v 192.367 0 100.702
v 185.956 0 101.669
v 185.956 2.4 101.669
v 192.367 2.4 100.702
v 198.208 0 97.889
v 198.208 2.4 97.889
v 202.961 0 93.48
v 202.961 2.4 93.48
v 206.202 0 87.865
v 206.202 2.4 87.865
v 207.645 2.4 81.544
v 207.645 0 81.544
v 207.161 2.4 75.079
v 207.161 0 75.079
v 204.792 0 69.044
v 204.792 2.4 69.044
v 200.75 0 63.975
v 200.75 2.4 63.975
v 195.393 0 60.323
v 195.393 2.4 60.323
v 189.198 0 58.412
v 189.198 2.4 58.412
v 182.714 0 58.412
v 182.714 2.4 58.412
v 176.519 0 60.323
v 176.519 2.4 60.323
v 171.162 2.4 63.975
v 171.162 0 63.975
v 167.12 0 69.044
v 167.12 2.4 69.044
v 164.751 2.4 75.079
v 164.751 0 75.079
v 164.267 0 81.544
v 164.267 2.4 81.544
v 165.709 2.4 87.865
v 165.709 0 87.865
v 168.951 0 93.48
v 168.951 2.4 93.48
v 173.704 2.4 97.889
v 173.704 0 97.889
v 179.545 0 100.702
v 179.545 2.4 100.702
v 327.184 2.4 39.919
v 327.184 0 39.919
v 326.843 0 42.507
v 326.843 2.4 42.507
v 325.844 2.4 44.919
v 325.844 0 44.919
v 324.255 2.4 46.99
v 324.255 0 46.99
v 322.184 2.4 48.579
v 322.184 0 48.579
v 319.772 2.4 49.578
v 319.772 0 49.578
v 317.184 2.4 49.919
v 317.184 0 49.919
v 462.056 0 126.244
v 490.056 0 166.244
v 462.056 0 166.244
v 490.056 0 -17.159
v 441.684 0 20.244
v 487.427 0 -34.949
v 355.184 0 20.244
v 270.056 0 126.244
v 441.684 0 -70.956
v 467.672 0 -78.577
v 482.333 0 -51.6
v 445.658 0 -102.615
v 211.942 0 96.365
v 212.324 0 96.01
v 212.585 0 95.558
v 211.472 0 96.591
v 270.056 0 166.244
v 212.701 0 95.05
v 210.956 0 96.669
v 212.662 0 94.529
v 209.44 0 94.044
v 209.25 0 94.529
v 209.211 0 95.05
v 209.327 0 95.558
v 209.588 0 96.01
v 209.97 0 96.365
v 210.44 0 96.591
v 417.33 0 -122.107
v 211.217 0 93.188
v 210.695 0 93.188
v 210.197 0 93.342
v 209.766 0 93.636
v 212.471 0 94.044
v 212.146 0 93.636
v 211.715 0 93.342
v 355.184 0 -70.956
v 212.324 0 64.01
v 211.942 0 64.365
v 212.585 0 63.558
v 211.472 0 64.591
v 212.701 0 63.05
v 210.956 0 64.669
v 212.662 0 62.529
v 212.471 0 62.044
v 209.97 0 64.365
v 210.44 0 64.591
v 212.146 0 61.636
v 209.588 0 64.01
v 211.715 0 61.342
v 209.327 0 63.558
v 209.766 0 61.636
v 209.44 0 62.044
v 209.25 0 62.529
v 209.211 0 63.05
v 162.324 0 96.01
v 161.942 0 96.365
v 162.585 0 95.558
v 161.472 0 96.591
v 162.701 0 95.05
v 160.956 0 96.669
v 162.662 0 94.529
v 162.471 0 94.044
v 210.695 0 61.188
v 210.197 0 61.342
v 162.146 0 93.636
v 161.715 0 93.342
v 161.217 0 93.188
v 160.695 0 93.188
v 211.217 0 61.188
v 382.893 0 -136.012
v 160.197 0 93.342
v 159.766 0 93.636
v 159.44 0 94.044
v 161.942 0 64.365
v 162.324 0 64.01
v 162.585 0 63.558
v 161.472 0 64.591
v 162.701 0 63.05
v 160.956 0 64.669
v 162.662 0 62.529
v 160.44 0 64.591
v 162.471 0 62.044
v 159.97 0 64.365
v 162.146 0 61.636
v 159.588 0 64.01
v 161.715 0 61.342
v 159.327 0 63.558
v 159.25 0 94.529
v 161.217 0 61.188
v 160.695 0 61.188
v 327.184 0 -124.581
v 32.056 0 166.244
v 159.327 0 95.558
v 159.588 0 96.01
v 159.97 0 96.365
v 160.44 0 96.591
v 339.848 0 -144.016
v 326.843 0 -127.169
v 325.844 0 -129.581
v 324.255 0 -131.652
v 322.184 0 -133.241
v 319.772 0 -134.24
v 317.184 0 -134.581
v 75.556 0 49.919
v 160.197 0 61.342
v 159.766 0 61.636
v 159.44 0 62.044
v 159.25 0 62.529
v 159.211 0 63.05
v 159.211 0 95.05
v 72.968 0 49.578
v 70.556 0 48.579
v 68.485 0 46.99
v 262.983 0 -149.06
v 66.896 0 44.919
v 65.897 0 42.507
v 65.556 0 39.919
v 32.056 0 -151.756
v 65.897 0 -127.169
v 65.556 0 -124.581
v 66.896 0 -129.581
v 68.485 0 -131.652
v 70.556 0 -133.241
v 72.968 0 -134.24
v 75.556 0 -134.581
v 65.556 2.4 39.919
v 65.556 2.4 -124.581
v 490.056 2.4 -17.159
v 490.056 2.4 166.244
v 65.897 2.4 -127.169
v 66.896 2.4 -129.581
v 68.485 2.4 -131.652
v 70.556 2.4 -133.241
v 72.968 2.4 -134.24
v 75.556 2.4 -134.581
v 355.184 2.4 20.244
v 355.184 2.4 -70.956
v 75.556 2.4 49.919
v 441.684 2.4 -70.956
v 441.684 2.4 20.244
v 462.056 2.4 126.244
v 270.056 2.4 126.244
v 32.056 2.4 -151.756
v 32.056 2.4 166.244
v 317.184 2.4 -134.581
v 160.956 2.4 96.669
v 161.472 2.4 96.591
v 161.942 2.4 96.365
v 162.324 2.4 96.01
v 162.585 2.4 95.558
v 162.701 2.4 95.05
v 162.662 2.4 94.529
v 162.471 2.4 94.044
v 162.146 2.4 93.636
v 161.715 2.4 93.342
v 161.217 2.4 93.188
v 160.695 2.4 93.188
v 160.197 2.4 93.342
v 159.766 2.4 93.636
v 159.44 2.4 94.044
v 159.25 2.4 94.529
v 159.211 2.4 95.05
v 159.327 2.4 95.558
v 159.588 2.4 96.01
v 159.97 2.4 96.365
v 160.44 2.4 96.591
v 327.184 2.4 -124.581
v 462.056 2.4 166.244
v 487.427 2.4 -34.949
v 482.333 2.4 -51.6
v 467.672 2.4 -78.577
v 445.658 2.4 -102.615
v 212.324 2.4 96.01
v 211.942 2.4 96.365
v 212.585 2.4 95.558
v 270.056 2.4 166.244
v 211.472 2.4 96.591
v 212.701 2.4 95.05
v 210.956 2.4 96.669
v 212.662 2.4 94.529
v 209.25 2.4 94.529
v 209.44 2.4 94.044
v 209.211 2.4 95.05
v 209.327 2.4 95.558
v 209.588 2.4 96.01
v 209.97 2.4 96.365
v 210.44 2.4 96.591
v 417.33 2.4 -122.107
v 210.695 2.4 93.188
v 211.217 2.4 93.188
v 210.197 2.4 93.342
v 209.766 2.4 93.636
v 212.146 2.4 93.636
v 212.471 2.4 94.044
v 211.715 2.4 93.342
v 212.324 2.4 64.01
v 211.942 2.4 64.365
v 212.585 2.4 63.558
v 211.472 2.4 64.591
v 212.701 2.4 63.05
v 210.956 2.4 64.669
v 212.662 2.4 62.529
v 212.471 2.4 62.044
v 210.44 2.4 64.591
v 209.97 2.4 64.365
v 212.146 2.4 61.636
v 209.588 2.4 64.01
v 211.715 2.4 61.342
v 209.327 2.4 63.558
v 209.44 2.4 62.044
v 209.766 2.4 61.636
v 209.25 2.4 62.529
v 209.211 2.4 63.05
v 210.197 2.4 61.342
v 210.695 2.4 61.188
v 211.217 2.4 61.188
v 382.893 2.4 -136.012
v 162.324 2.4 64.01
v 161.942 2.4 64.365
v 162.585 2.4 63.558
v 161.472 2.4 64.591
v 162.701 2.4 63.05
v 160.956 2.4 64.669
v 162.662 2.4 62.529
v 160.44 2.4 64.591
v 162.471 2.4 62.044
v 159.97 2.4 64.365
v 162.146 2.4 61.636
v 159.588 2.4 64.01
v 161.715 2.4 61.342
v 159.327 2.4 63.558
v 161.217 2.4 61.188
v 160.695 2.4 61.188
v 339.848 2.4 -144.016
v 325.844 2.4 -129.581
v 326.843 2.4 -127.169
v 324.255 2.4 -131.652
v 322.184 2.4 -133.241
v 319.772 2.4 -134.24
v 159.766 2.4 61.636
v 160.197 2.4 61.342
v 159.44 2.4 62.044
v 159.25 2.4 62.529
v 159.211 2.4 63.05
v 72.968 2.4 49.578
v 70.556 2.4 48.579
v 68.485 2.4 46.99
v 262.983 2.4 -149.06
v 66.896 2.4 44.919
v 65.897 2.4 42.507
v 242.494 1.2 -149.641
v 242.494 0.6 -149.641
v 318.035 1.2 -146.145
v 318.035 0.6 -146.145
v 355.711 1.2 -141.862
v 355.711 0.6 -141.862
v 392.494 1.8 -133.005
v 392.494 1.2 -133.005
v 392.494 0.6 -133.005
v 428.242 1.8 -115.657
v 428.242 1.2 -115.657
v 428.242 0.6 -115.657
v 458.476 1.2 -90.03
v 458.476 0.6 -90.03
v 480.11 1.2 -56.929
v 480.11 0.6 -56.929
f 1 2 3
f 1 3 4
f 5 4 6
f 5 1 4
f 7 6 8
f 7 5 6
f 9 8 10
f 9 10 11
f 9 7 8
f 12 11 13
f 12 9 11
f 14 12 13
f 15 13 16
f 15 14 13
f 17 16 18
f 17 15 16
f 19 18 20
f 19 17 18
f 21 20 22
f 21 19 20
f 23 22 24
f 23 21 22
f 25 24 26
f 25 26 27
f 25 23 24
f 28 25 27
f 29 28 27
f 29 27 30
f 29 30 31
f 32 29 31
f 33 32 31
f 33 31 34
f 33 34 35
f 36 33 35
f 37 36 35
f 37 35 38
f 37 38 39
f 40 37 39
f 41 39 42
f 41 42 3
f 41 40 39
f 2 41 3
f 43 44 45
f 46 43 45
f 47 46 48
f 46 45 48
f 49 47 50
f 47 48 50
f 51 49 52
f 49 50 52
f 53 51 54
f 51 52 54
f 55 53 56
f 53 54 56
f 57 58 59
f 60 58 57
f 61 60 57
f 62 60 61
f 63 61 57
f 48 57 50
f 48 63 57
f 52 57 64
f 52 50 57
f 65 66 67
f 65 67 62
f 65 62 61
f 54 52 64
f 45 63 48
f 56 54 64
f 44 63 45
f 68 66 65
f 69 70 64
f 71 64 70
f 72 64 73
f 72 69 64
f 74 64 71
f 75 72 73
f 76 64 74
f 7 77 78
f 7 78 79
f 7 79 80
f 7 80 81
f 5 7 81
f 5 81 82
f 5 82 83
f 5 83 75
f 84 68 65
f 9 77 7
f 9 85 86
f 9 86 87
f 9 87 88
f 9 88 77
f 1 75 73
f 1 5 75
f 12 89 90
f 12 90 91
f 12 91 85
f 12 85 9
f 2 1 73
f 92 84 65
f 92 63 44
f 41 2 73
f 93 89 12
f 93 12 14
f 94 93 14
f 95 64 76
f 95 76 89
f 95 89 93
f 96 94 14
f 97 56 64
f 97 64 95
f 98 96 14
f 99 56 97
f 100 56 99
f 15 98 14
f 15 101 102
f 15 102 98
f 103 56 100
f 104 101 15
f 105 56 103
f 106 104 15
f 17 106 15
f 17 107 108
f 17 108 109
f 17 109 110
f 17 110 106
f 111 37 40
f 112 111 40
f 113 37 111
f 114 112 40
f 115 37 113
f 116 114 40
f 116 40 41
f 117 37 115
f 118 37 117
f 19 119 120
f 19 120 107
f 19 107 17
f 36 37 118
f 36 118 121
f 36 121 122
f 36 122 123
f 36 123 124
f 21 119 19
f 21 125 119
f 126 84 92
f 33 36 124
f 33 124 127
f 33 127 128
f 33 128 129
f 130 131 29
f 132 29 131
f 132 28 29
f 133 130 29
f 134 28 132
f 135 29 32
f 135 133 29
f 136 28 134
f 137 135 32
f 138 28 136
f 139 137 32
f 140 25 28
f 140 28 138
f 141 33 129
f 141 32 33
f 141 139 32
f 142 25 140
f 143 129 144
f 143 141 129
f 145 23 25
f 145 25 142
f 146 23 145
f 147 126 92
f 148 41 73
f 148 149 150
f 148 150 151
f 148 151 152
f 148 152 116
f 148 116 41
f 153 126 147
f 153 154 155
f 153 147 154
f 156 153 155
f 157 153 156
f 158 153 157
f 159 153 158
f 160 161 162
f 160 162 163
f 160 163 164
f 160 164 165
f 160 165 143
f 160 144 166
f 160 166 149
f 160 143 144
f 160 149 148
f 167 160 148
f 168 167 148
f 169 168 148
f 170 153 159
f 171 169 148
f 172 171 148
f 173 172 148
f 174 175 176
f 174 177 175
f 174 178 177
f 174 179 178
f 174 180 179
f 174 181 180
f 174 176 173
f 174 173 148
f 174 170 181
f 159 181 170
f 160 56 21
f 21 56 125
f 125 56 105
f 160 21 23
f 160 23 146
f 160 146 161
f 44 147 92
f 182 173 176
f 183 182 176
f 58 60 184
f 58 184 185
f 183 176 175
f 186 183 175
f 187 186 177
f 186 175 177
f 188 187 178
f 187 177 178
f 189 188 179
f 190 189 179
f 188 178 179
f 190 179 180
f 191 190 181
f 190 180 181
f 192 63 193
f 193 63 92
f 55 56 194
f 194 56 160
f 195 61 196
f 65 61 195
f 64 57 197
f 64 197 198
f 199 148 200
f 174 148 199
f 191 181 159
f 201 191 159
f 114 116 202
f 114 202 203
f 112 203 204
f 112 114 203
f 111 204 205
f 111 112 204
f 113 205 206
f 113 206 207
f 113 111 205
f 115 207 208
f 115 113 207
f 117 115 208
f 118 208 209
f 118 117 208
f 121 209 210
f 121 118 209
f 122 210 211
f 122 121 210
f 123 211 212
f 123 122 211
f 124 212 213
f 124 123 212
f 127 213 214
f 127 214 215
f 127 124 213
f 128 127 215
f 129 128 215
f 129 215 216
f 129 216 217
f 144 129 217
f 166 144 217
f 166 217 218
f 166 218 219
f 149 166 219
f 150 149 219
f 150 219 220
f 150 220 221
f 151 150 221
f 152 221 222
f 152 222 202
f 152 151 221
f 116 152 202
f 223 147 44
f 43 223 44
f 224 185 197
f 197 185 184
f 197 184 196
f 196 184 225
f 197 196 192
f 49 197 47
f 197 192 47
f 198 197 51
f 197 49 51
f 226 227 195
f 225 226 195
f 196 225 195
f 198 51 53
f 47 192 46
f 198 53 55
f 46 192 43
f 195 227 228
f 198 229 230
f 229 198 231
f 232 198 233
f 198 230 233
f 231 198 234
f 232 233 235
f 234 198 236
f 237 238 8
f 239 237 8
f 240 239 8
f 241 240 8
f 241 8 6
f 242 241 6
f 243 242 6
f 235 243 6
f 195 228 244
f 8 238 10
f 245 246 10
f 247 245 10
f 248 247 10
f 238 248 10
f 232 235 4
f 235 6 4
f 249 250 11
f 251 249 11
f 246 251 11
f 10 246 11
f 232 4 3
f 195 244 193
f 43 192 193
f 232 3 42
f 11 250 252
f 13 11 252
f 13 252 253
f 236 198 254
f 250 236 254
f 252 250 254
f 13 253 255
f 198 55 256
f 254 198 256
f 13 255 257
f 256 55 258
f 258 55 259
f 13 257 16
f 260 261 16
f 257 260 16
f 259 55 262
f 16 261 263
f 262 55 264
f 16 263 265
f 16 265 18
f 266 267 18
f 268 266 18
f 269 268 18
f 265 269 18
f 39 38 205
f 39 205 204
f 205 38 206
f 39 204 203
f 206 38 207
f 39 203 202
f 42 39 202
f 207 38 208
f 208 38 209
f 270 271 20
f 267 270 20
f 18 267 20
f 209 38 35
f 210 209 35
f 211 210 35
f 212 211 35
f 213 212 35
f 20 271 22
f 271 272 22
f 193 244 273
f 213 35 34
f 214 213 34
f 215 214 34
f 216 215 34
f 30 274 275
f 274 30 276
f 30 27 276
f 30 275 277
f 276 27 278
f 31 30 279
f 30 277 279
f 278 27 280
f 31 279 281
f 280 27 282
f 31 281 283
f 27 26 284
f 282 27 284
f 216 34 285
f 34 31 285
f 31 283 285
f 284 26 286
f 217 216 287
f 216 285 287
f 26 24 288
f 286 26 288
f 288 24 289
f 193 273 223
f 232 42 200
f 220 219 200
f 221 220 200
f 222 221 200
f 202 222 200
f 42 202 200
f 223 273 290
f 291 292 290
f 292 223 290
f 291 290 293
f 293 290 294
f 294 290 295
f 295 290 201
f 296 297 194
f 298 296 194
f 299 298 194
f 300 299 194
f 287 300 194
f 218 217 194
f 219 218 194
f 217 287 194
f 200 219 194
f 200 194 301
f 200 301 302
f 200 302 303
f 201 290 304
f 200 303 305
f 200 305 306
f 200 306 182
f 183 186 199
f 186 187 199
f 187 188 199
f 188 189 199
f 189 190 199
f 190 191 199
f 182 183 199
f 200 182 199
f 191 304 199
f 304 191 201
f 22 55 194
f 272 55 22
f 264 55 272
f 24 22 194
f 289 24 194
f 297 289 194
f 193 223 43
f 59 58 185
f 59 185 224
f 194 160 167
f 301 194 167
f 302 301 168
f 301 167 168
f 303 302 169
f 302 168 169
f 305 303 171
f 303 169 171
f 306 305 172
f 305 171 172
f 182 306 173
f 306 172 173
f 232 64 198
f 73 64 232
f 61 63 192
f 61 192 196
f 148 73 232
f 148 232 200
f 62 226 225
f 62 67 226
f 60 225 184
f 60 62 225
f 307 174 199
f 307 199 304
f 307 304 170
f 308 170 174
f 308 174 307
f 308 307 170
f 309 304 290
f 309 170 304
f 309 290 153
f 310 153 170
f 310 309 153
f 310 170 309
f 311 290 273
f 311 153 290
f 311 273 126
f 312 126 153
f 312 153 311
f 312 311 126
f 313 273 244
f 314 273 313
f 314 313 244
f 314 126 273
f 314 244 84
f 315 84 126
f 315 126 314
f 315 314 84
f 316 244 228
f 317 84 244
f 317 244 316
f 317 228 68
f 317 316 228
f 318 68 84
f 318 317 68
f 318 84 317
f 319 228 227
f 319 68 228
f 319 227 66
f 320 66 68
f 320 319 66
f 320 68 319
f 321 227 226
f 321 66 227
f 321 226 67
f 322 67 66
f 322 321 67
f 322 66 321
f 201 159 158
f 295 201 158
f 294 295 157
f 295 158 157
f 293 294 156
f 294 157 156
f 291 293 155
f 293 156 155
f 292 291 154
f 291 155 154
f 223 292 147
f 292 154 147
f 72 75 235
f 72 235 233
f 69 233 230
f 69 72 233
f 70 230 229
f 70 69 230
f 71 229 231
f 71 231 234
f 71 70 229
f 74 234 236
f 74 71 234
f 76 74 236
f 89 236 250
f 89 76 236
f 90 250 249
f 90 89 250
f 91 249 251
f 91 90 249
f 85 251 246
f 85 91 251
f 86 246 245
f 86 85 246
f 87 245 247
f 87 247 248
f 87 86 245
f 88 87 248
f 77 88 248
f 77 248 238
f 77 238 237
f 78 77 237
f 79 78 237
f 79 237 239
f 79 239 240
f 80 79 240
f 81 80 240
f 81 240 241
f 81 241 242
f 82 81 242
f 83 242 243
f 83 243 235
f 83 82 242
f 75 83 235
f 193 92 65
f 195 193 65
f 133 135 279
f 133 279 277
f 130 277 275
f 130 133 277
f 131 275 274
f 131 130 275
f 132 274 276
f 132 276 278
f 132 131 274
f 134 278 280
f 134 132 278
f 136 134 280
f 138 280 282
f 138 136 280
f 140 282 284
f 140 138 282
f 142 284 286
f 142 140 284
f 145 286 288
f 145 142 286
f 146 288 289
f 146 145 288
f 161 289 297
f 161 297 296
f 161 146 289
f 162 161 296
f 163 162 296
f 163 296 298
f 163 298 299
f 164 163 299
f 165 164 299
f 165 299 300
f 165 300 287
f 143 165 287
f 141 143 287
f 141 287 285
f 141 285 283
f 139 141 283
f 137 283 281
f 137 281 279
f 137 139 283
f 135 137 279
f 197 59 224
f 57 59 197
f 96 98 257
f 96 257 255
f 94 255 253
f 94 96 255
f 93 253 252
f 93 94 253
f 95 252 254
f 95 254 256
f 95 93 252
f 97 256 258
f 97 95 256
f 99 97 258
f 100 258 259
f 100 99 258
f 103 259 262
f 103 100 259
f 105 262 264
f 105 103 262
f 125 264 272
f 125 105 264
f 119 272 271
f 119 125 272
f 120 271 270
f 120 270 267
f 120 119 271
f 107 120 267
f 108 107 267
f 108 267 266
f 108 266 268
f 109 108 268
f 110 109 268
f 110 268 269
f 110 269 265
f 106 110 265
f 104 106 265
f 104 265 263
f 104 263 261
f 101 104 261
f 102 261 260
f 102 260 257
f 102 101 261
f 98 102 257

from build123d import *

# Parameters (mm, degrees)
CROQUIS3_R              = 21.75
CROQUIS3_R_2            = 1.75
CROQUIS3_W              = 86.5
CROQUIS3_H              = 91.2
SALIENTE_EXTRUIR1_DEPTH = 2.4


with BuildPart() as part:
    # Croquis3 → Saliente-Extruir1 (new body)
    with BuildSketch(Plane(origin=(0, 0, 0), x_dir=(1, 0, 0), z_dir=(0, 1, 0))):
        with BuildLine():
            Line((462.055943971, -126.244094236), (270.055943971, -126.244094236))
            Line((270.055943971, -126.244094236), (270.055943971, -166.244094236))
            Line((270.055943971, -166.244094236), (32.055943971, -166.244094236))
            Line((32.055943971, -166.244094236), (32.055943971, 151.755905764))
            add(Edge.make_bspline(
                [(32.055943971, 151.755905764), (102.52055172, 152.083892996), (202.389819544, 151.163122701), (322.889642457, 147.223796339), (425.617825051, 131.81341345), (485.96008446, 74.272558466), (490.055943971, 17.159454913)],
                knots=[0, 0, 0, 0, 0.404967978, 0.578404141, 0.696078676, 1, 1, 1, 1], degree=3))
            Line((490.055943971, 17.159454913), (490.055943971, -126.244094236))
            Line((490.055943971, -126.244094236), (490.055943971, -166.244094236))
            Line((490.055943971, -166.244094236), (462.055943971, -166.244094236))
            Line((462.055943971, -166.244094236), (462.055943971, -126.244094236))
        make_face()
        with Locations(Location((185.955943971, -79.918767417, 0), (0, 0, 270))):
            Circle(CROQUIS3_R, mode=Mode.SUBTRACT)
        with Locations(Location((160.955943971, -62.918767417, 0), (0, 0, 270))):
            Circle(CROQUIS3_R_2, mode=Mode.SUBTRACT)
        with Locations(Location((210.955943971, -62.918767417, 0), (0, 0, 270))):
            Circle(CROQUIS3_R_2, mode=Mode.SUBTRACT)
        with Locations(Location((210.955943971, -94.918767417, 0), (0, 0, 270))):
            Circle(CROQUIS3_R_2, mode=Mode.SUBTRACT)
        with Locations(Location((160.955943971, -94.918767417, 0), (0, 0, 270))):
            Circle(CROQUIS3_R_2, mode=Mode.SUBTRACT)
        with BuildLine():
            Line((75.555943971, 134.581232583), (317.183594896, 134.581232583))
            ThreePointArc((317.183594896, 134.581232583), (324.254662708, 131.652300395), (327.183594896, 124.581232583))
            Line((327.183594896, 124.581232583), (327.183594896, -39.918767417))
            ThreePointArc((327.183594896, -39.918767417), (324.254662708, -46.989835229), (317.183594896, -49.918767417))
            Line((317.183594896, -49.918767417), (75.555943971, -49.918767417))
            ThreePointArc((75.555943971, -49.918767417), (68.484876159, -46.989835229), (65.555943971, -39.918767417))
            Line((65.555943971, -39.918767417), (65.555943971, 124.581232583))
            ThreePointArc((65.555943971, 124.581232583), (68.484876159, 131.652300395), (75.555943971, 134.581232583))
        make_face(mode=Mode.SUBTRACT)
        with Locations((398.433594896, 25.355905764)):
            Rectangle(CROQUIS3_W, CROQUIS3_H, mode=Mode.SUBTRACT)
    extrude(amount=SALIENTE_EXTRUIR1_DEPTH)


solid = part.part
